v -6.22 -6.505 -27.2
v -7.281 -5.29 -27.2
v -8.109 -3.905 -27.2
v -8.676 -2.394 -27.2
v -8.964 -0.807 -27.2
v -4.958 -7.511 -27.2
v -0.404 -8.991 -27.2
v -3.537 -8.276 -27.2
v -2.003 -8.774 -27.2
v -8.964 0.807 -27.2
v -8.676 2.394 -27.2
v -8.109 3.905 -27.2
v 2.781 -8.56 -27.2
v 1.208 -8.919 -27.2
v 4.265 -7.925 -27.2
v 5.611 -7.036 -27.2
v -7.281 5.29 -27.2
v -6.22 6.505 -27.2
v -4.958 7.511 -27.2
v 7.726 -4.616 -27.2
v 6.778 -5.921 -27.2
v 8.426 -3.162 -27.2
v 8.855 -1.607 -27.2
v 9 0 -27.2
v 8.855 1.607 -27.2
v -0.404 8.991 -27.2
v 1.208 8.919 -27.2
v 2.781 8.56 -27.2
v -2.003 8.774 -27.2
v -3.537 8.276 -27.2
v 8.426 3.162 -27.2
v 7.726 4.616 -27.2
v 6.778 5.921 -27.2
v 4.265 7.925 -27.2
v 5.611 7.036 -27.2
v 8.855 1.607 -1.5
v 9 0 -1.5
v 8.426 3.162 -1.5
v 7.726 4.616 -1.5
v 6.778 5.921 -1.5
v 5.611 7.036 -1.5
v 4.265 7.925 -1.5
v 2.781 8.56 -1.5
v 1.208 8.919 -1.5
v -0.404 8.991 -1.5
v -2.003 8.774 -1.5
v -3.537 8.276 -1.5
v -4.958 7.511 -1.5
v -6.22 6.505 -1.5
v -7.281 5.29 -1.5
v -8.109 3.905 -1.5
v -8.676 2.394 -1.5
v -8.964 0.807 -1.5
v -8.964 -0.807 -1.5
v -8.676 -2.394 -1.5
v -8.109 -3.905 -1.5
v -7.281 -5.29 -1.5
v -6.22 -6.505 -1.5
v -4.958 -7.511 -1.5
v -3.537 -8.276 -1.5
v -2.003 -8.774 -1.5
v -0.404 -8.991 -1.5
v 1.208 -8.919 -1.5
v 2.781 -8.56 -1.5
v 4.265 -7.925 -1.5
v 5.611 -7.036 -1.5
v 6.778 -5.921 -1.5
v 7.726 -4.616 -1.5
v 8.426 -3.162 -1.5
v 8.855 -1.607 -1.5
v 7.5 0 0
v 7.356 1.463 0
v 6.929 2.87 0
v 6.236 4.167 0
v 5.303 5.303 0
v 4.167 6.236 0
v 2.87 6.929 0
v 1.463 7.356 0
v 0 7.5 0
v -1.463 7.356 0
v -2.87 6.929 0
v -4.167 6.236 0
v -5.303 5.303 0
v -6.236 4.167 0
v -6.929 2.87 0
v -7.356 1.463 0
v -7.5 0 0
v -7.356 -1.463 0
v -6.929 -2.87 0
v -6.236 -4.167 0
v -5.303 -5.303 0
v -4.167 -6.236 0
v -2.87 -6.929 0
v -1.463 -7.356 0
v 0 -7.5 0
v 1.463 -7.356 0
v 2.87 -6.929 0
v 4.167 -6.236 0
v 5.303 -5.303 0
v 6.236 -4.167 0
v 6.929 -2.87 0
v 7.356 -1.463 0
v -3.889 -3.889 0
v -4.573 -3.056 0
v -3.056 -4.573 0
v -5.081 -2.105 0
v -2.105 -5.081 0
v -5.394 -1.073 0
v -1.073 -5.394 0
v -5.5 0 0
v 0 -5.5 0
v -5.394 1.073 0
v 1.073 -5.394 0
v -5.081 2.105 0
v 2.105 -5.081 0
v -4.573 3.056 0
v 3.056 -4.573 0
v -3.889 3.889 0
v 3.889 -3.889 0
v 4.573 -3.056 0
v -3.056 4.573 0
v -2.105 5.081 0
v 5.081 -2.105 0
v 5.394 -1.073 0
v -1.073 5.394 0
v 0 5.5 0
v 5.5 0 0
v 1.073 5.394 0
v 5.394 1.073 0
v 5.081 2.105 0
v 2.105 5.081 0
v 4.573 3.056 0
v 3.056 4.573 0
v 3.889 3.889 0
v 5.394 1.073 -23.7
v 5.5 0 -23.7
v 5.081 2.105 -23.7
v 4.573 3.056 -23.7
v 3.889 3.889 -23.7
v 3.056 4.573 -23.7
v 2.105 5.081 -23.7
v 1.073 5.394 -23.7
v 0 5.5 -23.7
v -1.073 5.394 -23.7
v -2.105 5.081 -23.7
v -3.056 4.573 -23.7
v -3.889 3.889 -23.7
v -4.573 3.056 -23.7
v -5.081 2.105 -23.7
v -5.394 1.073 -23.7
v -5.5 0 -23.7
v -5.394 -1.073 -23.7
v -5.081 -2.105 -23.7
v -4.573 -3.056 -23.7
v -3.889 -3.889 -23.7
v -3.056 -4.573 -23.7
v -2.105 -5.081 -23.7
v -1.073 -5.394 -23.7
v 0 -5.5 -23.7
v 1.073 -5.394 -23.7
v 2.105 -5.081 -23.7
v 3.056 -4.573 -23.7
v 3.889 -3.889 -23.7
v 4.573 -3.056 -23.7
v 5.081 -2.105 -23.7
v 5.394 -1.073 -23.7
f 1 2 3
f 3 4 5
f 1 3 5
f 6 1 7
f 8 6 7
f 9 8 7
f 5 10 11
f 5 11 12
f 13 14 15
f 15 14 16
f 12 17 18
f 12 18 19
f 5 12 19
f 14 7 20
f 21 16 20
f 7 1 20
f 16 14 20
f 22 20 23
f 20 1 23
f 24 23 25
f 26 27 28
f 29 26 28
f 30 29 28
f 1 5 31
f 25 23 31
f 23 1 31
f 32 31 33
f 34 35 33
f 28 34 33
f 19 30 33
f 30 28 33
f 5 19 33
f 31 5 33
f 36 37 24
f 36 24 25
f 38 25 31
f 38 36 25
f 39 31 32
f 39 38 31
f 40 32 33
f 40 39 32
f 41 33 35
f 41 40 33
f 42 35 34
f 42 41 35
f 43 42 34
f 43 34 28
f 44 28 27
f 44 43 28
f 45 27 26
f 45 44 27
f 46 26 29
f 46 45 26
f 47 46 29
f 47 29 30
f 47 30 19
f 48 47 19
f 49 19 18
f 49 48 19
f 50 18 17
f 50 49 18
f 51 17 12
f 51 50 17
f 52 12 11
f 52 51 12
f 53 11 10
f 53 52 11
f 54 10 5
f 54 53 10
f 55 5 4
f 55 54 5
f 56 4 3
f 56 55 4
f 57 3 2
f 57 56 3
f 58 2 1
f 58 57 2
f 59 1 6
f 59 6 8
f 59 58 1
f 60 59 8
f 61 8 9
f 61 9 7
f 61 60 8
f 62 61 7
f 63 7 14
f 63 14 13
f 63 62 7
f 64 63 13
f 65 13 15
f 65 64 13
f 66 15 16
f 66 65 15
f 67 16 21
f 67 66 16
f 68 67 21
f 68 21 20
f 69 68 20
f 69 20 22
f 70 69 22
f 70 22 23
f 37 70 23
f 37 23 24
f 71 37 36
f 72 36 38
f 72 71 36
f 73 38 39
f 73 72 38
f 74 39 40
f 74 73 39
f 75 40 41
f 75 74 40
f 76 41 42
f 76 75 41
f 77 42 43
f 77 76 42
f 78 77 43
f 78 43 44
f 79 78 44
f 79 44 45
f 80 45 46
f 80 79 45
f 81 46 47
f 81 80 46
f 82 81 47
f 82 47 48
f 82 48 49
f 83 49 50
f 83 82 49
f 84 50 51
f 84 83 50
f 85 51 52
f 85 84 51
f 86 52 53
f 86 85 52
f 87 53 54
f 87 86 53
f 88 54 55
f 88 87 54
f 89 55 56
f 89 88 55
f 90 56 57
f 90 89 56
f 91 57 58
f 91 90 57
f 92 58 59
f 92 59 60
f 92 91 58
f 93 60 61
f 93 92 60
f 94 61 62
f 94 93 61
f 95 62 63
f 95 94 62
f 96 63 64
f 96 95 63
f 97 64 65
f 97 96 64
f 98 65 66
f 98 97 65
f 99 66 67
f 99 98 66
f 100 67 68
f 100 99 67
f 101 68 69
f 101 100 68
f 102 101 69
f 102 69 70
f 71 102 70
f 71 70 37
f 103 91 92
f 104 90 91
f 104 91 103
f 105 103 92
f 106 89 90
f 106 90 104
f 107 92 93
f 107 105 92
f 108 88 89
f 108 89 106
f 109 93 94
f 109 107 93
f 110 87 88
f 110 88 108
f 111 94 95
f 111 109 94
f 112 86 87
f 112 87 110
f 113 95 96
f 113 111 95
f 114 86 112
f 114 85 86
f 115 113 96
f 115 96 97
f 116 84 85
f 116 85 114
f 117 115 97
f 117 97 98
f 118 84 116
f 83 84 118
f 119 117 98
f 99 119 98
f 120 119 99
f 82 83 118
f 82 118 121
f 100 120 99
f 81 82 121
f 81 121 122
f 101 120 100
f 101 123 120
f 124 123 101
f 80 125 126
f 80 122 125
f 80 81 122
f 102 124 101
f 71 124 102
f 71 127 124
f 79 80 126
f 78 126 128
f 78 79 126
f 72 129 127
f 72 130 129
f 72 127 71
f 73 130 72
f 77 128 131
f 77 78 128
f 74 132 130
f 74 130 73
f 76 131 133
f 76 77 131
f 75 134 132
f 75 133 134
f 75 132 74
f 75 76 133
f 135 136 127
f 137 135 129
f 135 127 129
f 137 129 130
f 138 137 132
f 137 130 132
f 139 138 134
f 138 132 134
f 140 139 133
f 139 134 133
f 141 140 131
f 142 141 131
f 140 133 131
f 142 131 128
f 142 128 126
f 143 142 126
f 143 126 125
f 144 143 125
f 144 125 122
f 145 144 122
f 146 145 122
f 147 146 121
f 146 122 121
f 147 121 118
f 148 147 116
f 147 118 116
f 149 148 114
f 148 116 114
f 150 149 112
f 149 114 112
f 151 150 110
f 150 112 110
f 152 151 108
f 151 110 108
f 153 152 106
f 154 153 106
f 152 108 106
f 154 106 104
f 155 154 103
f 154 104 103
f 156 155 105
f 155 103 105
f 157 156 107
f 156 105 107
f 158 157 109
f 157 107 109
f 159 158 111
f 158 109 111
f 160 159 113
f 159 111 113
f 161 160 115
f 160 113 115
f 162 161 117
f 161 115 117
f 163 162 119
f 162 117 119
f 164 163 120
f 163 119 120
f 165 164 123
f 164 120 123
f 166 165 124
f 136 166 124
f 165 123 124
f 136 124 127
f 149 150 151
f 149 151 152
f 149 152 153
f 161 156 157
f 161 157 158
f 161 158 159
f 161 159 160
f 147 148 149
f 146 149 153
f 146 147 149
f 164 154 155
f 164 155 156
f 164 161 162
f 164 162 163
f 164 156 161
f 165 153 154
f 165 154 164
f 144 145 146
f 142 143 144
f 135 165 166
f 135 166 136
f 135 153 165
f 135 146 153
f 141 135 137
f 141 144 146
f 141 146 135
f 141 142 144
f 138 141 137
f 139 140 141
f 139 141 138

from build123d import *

# Parameters (mm, degrees)
F0_R     = 9
F1_DEPTH = 27.2
F2_R     = 5.5
F3_DEPTH = 23.7
F4_SIZE  = 1.5


with BuildPart() as f1:
    # F0 (on Top) → F1 (new body)
    with BuildSketch(Plane.XY):
        Circle(F0_R)
    extrude(amount=-F1_DEPTH)

    # F2 (on face) → F3 (cut)
    with BuildSketch(Plane.XY):
        Circle(F2_R)
    extrude(amount=-F3_DEPTH, mode=Mode.SUBTRACT)

    # F4
    f4_edges = [f1.edges().sort_by_distance(p)[0] for p in [
        (-9, 0, 0),
    ]]
    chamfer(f4_edges, length=F4_SIZE)


solid = f1.part
